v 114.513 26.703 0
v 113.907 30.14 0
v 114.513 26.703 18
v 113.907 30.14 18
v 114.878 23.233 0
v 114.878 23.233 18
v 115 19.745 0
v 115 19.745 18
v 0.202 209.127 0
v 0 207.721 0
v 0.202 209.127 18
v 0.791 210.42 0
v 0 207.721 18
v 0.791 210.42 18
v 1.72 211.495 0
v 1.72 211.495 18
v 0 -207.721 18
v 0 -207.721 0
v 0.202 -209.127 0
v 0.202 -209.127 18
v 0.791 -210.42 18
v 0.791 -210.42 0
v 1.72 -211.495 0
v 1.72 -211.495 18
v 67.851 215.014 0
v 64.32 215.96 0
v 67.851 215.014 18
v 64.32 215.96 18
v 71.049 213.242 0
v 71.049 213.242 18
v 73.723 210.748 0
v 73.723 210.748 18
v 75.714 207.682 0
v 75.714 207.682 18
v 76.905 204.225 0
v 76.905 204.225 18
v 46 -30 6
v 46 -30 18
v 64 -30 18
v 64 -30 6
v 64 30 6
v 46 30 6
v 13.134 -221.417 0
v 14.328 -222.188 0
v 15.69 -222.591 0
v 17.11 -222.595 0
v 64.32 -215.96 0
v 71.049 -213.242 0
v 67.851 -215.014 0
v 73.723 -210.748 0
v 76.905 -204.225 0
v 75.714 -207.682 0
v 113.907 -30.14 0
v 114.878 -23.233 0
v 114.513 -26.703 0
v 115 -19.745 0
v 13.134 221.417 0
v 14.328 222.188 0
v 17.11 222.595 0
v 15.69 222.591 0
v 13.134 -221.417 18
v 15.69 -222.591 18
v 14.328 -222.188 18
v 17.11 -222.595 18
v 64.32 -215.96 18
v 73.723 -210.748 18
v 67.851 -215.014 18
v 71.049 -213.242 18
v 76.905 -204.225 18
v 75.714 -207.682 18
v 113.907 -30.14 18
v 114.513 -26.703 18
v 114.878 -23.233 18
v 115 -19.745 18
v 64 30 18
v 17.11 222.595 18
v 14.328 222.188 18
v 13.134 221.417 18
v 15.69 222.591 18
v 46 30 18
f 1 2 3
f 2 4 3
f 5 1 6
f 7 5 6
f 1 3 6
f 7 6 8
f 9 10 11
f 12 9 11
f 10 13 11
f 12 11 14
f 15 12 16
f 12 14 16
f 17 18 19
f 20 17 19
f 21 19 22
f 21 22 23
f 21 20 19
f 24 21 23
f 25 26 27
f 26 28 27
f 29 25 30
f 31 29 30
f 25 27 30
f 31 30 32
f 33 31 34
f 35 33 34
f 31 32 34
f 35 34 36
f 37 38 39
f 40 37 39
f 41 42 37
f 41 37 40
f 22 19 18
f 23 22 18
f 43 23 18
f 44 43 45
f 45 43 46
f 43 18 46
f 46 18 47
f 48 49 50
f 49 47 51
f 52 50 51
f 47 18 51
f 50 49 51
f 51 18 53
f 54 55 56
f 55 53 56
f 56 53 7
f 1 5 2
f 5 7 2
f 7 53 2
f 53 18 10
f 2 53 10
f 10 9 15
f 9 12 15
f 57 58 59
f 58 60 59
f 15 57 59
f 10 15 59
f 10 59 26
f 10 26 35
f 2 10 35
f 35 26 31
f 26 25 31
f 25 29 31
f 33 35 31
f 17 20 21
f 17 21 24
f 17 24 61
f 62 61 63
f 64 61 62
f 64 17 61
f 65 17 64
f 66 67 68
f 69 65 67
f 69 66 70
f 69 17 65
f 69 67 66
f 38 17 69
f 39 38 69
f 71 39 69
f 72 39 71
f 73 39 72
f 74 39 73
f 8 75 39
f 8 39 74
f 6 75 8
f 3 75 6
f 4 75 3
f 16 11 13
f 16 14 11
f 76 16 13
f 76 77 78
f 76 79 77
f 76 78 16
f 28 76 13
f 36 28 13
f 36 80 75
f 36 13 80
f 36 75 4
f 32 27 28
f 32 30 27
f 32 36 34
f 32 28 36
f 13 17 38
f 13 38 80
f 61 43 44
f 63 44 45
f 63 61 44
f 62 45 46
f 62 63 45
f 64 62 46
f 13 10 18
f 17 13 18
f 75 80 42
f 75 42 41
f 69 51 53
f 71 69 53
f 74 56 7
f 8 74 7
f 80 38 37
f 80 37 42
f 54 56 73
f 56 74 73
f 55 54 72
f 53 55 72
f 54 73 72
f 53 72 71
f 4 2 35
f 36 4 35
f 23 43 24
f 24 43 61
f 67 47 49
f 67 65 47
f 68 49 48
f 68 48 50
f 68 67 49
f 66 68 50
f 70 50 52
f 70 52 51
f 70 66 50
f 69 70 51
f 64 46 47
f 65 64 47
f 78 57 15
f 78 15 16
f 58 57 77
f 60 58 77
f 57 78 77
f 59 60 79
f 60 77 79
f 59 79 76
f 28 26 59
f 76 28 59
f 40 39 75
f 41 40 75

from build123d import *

# Parameters (mm, degrees)
PAD_DEPTH    = 18
SKETCH001_W  = 18
SKETCH001_H  = 60
POCKET_DEPTH = 12
CHAMFER_SIZE = 15
FILLET_R     = 5
FILLET001_R  = 15
FILLET002_R  = 50


with BuildPart() as part:
    # Sketch → Pad (new body)
    with BuildSketch(Plane.XY):
        Polygon((0, 225), (0, -225), (74.720813, -214.498675), (115, -25), (115, 25), (74.720813, 214.498675), align=None)
    extrude(amount=PAD_DEPTH)

    # Sketch001 → Pocket (cut)
    with BuildSketch(Plane.XY.offset(18)):
        with Locations((55, 0)):
            Rectangle(SKETCH001_W, SKETCH001_H)
    extrude(amount=-POCKET_DEPTH, mode=Mode.SUBTRACT)

    # Chamfer
    chamfer_edges = [part.edges().sort_by_distance(p)[0] for p in [
        (0, -225, 9),
        (0, 225, 9),
    ]]
    chamfer(chamfer_edges, length=CHAMFER_SIZE)

    # Fillet
    fillet_edges = [part.edges().sort_by_distance(p)[0] for p in [
        (14.854021, 222.912403, 9),
        (0, 210, 9),
        (0, -210, 9),
        (14.854021, -222.912403, 9),
    ]]
    fillet(fillet_edges, radius=FILLET_R)

    # Fillet001
    fillet001_edges = [part.edges().sort_by_distance(p)[0] for p in [
        (74.720813, -214.498675, 9),
        (74.720813, 214.498675, 9),
    ]]
    fillet(fillet001_edges, radius=FILLET001_R)

    # Fillet002
    fillet002_edges = [part.edges().sort_by_distance(p)[0] for p in [
        (115, -25, 9),
        (115, 25, 9),
    ]]
    fillet(fillet002_edges, radius=FILLET002_R)


solid = part.part
